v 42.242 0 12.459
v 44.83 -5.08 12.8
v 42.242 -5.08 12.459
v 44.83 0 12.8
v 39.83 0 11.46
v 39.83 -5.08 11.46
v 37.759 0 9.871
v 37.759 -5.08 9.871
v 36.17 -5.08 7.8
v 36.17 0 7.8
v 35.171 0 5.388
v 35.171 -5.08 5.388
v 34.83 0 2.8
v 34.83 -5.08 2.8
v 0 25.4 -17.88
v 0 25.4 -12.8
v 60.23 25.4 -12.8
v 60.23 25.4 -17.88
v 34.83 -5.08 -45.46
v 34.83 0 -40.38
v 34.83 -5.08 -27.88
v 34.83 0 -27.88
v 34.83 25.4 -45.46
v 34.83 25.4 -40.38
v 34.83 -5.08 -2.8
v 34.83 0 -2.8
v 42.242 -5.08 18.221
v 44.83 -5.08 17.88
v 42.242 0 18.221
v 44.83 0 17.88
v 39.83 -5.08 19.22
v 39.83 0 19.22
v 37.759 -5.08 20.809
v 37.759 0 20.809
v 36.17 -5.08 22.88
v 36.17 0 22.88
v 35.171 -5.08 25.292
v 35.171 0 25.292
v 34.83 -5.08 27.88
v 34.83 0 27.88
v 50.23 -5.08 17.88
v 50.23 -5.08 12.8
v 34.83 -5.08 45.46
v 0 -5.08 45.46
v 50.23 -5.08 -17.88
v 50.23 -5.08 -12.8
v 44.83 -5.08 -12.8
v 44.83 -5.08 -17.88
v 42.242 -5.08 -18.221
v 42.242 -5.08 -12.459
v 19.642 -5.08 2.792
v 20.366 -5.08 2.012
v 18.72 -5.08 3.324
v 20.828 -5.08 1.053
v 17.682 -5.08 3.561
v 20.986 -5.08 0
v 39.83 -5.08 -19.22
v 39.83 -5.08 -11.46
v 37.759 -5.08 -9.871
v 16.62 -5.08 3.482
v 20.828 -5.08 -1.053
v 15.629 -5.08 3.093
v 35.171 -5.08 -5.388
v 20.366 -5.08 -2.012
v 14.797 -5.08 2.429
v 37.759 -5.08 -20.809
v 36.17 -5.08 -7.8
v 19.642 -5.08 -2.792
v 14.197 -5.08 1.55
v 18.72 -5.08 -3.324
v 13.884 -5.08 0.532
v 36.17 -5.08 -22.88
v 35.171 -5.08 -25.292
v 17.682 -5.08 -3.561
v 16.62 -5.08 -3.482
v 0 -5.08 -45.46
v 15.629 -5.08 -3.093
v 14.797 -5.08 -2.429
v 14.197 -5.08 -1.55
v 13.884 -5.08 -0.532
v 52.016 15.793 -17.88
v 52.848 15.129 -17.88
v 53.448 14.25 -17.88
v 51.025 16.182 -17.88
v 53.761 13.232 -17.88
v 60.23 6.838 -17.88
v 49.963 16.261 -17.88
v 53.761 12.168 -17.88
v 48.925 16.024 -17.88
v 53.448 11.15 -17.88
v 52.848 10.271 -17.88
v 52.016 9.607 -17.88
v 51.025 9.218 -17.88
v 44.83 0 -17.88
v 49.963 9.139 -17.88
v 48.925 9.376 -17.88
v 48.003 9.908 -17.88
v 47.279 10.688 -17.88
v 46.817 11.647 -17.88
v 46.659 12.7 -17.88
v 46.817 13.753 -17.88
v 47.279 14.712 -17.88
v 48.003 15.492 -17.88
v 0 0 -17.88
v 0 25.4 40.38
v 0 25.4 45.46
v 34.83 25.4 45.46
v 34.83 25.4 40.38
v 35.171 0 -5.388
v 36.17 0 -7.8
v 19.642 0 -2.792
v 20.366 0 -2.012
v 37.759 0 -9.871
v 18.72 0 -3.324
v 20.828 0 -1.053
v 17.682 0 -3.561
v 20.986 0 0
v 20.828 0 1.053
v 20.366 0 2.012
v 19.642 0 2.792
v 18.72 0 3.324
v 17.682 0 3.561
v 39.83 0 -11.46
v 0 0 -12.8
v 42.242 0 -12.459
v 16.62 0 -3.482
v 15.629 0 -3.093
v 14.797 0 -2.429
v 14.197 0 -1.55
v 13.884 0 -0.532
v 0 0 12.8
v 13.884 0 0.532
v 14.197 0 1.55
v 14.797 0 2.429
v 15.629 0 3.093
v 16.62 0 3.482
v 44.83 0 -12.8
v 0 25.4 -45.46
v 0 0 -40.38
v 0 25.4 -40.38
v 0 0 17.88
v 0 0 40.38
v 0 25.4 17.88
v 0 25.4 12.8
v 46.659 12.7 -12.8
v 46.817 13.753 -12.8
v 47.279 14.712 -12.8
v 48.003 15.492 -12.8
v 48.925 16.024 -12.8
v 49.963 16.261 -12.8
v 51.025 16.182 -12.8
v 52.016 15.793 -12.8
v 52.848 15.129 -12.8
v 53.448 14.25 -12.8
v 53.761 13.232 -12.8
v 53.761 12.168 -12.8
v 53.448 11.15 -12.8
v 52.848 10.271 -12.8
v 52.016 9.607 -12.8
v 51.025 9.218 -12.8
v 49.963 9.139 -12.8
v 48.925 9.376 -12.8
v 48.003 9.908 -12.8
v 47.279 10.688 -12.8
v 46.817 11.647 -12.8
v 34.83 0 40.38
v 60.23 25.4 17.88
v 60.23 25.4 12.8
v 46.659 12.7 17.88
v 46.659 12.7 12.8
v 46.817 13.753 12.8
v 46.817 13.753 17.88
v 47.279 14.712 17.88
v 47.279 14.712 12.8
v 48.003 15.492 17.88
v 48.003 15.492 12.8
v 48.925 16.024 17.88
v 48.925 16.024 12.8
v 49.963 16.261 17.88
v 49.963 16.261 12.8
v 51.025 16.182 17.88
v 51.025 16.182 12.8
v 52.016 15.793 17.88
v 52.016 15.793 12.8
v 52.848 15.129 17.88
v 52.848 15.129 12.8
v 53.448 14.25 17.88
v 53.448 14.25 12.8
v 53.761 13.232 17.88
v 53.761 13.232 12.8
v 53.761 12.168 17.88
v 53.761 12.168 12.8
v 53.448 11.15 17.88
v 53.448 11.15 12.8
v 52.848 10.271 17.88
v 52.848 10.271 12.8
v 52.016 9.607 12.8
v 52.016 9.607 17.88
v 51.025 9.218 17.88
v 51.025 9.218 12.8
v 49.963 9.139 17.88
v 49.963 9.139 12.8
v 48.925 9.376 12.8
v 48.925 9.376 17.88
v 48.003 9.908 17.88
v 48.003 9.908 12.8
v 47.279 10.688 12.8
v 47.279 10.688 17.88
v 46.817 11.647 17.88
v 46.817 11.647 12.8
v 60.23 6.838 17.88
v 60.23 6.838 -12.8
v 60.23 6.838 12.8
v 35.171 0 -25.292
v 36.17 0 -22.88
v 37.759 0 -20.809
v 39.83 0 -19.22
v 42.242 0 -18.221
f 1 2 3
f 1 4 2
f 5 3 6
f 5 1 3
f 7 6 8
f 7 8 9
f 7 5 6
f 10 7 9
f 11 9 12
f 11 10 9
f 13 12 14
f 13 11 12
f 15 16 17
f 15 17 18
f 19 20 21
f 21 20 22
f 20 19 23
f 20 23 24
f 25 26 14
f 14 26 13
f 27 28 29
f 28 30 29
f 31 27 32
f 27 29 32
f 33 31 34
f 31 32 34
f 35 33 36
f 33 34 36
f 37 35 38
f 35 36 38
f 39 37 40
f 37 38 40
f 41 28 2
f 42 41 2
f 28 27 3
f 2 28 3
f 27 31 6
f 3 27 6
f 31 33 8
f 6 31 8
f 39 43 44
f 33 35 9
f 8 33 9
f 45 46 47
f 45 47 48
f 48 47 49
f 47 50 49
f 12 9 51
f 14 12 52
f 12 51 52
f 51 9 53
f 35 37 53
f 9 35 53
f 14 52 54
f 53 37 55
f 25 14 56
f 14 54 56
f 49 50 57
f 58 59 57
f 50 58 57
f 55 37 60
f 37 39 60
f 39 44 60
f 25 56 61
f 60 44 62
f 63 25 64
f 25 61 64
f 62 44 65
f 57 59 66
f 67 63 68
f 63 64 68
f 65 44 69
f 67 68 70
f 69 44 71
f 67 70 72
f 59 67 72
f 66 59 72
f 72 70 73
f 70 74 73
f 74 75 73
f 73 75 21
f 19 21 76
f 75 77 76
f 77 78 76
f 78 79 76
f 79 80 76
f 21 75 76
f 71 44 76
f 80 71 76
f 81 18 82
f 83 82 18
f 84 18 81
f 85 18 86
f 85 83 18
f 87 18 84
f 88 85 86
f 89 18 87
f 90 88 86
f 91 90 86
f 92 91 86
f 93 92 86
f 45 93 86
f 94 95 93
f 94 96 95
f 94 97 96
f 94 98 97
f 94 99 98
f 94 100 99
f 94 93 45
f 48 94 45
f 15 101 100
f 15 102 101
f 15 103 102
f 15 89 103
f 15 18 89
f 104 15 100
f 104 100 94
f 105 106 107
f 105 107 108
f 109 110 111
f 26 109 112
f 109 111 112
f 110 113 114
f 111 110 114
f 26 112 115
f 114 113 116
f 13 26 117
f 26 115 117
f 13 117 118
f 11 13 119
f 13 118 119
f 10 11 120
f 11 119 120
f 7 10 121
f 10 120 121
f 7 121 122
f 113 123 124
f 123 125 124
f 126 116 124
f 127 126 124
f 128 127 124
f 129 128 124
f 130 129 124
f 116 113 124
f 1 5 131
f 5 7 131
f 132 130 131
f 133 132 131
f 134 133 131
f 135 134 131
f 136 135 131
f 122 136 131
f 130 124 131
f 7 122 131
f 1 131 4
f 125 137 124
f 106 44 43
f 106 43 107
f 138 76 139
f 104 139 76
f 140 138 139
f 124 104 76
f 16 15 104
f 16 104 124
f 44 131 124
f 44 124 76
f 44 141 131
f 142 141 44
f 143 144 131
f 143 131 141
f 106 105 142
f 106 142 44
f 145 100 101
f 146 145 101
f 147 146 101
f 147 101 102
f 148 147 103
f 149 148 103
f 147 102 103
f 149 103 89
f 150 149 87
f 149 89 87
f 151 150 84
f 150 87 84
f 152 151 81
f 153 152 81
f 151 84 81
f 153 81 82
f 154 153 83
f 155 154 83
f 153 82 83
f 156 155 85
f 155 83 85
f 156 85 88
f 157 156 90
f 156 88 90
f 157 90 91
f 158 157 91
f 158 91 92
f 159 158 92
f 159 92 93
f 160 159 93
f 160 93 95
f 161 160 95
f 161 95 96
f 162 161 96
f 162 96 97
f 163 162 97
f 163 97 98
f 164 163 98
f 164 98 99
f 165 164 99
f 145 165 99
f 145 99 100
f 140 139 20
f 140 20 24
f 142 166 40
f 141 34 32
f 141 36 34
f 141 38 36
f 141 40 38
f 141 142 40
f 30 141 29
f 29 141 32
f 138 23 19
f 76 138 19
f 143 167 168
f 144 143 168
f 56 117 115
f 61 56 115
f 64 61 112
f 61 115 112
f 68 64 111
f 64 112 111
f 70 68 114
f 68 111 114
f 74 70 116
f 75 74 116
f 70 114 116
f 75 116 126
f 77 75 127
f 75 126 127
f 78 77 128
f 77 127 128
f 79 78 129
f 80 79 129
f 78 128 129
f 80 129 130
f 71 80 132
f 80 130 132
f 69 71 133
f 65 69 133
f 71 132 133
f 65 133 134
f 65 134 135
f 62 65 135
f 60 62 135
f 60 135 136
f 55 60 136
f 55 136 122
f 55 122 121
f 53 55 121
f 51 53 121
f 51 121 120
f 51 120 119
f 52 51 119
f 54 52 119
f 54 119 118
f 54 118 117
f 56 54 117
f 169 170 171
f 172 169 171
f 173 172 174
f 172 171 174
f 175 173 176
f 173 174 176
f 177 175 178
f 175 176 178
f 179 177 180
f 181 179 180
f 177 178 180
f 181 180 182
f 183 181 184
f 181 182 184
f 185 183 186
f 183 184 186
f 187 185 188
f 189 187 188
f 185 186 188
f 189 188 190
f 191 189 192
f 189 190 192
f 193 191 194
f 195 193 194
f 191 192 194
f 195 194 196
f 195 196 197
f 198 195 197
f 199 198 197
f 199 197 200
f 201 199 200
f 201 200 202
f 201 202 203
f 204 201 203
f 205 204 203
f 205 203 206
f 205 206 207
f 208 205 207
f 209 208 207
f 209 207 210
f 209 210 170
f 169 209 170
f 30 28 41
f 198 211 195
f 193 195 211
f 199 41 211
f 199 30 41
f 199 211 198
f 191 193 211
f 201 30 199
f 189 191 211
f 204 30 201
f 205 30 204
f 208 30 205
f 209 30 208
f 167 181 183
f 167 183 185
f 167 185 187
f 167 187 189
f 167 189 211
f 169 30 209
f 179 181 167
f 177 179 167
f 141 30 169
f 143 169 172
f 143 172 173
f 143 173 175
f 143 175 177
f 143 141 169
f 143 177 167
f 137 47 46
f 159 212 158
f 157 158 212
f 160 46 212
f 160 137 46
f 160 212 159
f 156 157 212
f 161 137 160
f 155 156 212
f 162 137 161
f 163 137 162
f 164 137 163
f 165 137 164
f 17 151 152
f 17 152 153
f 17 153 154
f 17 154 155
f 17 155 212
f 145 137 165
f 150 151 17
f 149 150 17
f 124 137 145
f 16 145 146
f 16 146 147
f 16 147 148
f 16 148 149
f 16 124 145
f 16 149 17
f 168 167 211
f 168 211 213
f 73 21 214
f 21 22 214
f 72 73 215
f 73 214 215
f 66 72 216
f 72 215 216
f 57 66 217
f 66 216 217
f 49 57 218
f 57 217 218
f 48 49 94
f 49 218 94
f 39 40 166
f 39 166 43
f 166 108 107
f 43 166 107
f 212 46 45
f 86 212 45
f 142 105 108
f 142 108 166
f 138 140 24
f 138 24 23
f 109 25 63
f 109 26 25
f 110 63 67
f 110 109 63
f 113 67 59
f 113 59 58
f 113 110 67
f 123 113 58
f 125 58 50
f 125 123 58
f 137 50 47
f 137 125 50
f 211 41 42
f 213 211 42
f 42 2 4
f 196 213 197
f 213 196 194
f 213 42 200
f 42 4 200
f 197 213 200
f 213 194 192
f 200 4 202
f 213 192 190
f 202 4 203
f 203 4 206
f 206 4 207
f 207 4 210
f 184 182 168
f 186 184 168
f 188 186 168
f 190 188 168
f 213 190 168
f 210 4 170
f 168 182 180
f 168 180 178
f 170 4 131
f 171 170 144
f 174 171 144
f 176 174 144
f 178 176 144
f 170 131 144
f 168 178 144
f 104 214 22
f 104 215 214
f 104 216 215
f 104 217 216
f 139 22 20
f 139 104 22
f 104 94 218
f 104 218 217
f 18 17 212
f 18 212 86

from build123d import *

# Parameters (mm, degrees)
BOSS_EXTRUDE1_DEPTH     = 34.83
SKETCH3_W               = 5.08
SKETCH3_H               = 30.48
BOSS_EXTRUDE2_DEPTH     = 25.4
F_1_4_CLEARANCE_HOLE1_D = 7.14248
CHAMFER1_SIZE           = 10
CHAMFER1_SIZE2          = 11.917535926
FILLET1_R               = 10
F_1_4_CLEARANCE_HOLE2_D = 7.14248


with BuildPart() as part:
    # Sketch2 → Boss-Extrude1 (new body)
    with BuildSketch(Plane(origin=(0, 0, 0), x_dir=(0, 0, -1), z_dir=(1, 0, 0))):
        Polygon((-12.8, 0), (-12.8, 25.4), (-17.88, 25.4), (-17.88, 0), (-40.38, 0), (-40.38, 25.4), (-45.46, 25.4), (-45.46, -5.08), (45.46, -5.08), (45.46, 25.4), (40.38, 25.4), (40.38, 0), (17.88, 0), (17.88, 25.4), (12.8, 25.4), (12.8, 0), align=None)
    extrude(amount=BOSS_EXTRUDE1_DEPTH)

    # Sketch3 → Boss-Extrude2 (add)
    with BuildSketch(Plane(origin=(34.83, 0, 0), x_dir=(0, 0, -1), z_dir=(1, 0, 0))):
        with Locations((-15.34, 10.16)):
            Rectangle(SKETCH3_W, SKETCH3_H)
        with Locations((15.34, 10.16)):
            Rectangle(SKETCH3_W, SKETCH3_H)
    extrude(amount=BOSS_EXTRUDE2_DEPTH)

    # 1/4 Clearance Hole1 (through all)
    with Locations(Plane.XY.offset(17.88)):
        with Locations((50.23, 12.7)):
            Hole(F_1_4_CLEARANCE_HOLE1_D / 2)

    # Chamfer1
    chamfer1_edges = [part.edges().sort_by_distance(p)[0] for p in [
        (60.23, -5.08, -15.34),
        (60.23, -5.08, 15.34),
    ]]
    chamfer1_side = [part.faces().sort_by_distance(p)[0] for p in [
        (19.684206994, -5.08, 0),
    ]]
    chamfer(chamfer1_edges, length=CHAMFER1_SIZE, length2=CHAMFER1_SIZE2, reference=chamfer1_side[0])

    # Fillet1
    fillet1_edges = [part.edges().sort_by_distance(p)[0] for p in [
        (34.83, -2.54, -12.8),
        (34.83, -2.54, -17.88),
        (34.83, -2.54, 12.8),
        (34.83, -2.54, 17.88),
    ]]
    fillet(fillet1_edges, radius=FILLET1_R)

    # 1/4 Clearance Hole2 (through all)
    with Locations(Plane(origin=(0, -5.08, 0), x_dir=(-1, 0, 0), z_dir=(0, -1, 0))):
        with Locations((-17.415, 0)):
            Hole(F_1_4_CLEARANCE_HOLE2_D / 2)


solid = part.part
